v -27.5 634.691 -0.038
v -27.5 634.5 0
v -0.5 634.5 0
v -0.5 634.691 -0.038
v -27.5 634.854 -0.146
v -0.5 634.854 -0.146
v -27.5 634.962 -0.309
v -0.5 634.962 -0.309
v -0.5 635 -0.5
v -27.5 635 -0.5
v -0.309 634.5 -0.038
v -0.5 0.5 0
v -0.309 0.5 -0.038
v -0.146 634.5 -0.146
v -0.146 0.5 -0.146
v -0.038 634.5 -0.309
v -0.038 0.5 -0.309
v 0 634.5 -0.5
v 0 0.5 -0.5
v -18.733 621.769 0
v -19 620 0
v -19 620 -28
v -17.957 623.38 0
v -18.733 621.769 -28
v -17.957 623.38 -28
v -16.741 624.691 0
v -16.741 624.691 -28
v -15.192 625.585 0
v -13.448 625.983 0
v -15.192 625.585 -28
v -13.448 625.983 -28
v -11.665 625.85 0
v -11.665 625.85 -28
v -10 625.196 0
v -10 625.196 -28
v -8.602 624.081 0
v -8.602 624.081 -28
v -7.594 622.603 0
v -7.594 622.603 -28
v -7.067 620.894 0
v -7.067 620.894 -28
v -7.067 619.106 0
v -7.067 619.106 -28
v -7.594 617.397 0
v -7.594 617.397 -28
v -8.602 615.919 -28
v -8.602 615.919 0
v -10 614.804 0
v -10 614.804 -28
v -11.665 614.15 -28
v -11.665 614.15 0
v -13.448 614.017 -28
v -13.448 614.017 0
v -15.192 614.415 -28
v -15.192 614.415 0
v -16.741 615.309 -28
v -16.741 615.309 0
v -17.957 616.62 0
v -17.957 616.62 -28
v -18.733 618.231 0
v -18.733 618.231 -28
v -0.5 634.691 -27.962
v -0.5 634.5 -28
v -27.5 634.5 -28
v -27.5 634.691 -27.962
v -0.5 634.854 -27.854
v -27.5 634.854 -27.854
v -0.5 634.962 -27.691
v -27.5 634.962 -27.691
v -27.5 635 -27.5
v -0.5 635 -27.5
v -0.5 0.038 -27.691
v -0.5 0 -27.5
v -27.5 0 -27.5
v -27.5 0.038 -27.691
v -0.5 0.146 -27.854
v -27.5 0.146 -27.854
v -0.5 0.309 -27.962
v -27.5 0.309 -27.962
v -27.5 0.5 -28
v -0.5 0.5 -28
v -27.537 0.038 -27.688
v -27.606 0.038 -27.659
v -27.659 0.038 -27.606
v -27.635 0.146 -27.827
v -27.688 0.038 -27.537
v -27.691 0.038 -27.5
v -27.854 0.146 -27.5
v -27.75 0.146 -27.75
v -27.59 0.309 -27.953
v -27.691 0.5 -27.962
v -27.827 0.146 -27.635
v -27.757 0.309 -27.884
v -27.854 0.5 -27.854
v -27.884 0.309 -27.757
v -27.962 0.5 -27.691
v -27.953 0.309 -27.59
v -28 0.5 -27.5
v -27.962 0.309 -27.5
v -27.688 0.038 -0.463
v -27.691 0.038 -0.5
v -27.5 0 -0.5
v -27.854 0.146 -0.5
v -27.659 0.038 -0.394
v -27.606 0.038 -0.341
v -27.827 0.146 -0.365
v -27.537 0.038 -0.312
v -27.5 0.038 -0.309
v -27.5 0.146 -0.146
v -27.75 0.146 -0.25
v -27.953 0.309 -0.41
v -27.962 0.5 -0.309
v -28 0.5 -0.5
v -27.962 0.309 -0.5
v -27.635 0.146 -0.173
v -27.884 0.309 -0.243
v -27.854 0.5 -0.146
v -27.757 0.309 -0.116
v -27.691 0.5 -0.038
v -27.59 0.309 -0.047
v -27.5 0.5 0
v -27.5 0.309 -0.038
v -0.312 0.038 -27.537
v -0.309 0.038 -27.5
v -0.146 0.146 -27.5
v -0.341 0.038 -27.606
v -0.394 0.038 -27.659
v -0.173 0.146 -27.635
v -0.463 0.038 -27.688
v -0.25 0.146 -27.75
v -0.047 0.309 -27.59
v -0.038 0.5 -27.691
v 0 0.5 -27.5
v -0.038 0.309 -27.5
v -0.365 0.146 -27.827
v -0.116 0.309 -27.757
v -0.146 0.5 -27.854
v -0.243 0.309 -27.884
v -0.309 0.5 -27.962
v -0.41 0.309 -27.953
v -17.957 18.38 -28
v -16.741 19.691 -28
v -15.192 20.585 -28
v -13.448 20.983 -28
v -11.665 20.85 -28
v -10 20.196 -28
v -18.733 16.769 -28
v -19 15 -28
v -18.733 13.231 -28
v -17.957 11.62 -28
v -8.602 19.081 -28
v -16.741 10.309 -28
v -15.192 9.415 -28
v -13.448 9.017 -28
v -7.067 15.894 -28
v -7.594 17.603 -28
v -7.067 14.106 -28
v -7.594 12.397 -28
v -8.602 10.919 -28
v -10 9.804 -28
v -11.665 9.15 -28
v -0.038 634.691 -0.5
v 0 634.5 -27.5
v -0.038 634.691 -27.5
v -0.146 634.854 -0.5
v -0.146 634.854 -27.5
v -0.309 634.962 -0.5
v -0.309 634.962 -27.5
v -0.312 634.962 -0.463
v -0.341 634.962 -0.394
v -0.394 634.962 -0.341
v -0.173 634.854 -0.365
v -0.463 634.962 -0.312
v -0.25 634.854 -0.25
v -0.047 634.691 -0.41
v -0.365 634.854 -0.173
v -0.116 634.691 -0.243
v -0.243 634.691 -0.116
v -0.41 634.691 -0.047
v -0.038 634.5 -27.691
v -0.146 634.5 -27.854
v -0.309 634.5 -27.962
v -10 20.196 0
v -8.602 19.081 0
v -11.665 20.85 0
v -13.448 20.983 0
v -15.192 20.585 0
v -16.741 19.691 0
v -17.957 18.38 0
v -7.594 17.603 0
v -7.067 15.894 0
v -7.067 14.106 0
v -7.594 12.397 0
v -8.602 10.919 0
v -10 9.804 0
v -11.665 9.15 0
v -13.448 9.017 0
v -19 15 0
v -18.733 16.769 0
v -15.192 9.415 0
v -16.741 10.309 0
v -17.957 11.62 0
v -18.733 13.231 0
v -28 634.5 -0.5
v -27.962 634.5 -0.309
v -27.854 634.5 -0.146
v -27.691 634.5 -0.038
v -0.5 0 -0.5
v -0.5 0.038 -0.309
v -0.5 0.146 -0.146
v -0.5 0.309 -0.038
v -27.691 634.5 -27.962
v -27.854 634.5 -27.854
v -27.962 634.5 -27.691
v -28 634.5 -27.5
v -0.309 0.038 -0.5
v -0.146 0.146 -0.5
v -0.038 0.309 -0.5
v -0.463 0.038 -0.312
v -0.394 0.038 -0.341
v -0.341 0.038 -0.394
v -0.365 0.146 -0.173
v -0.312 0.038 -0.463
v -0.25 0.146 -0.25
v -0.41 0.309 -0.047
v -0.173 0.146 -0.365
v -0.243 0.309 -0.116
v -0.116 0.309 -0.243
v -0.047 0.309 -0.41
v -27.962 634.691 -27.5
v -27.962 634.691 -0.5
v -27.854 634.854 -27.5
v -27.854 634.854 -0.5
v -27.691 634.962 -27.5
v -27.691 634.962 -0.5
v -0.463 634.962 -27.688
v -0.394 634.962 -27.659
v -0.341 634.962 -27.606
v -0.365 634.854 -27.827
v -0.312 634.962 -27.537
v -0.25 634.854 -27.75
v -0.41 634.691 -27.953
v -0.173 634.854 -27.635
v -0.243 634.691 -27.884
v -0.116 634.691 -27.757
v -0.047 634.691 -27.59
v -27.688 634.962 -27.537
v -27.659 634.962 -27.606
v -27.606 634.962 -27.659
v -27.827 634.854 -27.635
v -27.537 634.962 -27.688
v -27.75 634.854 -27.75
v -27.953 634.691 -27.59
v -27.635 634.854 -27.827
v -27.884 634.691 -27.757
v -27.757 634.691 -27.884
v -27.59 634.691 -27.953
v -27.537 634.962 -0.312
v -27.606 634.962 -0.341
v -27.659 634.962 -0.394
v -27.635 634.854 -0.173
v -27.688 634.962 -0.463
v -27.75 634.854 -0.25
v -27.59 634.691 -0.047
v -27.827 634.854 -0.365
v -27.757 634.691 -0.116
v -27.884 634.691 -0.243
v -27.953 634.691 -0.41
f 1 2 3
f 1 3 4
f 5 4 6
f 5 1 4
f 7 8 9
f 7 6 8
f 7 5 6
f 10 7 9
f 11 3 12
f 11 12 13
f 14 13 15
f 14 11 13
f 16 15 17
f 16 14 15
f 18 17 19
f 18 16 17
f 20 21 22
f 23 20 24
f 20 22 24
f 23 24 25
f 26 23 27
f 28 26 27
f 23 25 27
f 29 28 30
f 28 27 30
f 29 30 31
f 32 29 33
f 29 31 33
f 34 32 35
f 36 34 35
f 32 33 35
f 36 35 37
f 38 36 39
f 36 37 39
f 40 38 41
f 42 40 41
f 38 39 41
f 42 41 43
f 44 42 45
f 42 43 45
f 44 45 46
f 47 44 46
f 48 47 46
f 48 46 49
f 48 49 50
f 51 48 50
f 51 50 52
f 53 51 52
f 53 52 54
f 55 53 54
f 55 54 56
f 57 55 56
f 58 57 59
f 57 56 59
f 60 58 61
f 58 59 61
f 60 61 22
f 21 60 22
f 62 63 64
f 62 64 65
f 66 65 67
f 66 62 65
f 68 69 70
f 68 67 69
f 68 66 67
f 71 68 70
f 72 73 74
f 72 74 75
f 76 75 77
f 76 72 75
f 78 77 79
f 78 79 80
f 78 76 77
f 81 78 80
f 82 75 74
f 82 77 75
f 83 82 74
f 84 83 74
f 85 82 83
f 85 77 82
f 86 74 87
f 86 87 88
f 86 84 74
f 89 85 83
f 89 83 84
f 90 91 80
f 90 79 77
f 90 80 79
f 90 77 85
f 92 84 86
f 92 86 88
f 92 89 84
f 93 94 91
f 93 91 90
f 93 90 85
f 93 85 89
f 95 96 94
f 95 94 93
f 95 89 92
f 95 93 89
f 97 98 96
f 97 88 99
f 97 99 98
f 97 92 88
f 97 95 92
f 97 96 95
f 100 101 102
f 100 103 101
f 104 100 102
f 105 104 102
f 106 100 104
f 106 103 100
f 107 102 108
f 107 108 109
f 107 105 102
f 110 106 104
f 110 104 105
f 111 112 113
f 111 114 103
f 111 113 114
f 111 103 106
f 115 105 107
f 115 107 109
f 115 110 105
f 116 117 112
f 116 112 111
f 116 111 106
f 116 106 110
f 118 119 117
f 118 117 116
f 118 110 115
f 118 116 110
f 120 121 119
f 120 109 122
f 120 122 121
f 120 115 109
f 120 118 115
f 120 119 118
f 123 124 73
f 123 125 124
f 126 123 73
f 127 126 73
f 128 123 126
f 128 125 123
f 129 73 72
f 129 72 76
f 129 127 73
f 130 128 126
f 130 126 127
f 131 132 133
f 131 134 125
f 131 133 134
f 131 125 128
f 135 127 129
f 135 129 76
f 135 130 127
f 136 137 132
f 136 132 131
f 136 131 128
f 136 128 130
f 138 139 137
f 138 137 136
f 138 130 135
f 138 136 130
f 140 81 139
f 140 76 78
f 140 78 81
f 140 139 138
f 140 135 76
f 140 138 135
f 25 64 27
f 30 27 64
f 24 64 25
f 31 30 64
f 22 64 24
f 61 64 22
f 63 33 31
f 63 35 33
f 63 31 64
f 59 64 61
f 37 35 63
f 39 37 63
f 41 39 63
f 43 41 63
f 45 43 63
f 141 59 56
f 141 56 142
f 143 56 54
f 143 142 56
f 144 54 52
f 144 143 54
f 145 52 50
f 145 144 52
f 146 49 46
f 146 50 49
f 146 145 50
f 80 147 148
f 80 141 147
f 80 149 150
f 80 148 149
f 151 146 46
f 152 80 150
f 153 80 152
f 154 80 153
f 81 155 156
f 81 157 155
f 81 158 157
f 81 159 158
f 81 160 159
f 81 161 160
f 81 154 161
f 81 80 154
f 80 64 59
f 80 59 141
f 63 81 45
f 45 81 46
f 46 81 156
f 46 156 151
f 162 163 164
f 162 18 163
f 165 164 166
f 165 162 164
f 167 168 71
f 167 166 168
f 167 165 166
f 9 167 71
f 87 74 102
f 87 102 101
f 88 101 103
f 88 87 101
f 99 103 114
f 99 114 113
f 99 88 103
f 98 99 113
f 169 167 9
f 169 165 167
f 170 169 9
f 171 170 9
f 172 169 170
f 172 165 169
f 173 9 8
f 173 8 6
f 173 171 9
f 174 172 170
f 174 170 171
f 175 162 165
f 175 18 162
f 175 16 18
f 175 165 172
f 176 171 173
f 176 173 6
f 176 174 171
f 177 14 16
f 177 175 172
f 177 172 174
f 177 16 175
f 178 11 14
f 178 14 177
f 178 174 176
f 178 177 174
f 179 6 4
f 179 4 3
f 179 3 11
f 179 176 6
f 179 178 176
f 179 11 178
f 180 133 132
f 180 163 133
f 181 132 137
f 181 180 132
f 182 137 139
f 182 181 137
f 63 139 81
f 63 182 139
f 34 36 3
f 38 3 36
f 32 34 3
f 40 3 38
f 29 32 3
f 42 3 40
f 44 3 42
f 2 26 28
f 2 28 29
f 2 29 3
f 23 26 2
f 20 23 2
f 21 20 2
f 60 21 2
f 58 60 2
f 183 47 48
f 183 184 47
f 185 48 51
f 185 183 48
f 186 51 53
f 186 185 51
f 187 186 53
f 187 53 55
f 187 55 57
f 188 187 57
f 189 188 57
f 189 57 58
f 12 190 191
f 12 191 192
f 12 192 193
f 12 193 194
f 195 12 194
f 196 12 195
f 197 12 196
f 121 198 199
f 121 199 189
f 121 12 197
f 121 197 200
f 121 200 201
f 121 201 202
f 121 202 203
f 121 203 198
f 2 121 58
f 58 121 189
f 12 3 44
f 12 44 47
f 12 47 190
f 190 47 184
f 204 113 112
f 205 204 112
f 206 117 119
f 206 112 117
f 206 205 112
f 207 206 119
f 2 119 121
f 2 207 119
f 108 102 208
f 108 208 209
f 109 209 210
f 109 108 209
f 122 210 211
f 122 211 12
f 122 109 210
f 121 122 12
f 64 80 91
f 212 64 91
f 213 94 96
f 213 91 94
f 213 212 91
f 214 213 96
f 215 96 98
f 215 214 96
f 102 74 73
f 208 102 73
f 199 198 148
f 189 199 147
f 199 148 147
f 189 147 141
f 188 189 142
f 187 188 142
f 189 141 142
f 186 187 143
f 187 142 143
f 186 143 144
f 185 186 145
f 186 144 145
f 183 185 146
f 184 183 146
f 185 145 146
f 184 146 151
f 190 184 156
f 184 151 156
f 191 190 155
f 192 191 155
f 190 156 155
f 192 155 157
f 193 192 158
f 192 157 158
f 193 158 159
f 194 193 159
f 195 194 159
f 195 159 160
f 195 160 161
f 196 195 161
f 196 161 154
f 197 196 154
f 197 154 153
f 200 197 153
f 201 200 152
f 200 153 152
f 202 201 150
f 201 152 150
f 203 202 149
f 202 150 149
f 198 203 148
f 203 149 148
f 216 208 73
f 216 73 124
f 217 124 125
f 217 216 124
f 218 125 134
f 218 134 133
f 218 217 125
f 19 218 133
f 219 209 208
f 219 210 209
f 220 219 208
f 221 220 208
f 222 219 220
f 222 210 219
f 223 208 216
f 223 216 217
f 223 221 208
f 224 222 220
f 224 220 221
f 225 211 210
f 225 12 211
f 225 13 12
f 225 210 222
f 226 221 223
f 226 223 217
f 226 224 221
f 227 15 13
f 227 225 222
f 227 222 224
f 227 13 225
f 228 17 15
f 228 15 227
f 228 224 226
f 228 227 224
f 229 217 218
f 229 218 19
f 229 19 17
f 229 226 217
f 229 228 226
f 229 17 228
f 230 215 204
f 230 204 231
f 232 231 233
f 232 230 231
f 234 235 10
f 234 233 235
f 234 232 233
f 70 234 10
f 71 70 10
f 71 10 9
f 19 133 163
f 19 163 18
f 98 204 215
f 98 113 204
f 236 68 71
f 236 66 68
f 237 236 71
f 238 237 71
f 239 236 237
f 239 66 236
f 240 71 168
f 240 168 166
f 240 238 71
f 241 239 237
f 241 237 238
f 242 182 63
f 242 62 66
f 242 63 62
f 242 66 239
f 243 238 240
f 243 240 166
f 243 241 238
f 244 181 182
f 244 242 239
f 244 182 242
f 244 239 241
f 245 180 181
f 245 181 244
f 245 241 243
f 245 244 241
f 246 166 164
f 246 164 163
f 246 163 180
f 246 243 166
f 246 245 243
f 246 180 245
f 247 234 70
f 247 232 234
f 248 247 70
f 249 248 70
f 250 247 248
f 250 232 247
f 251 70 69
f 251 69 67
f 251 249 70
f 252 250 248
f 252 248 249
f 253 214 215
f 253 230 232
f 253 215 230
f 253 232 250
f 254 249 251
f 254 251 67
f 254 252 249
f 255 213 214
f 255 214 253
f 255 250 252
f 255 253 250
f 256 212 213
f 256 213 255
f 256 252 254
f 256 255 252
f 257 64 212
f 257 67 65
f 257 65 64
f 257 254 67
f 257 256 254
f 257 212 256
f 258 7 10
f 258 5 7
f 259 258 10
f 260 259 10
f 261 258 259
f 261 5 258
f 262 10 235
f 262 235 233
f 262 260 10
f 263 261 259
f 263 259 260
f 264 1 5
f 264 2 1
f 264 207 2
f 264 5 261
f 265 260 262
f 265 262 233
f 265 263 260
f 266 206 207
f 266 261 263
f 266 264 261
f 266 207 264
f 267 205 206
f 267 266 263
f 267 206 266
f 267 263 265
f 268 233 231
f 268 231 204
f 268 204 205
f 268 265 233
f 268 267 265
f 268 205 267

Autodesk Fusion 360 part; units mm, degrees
sketch "Sketch2" plane through (0, 0, 0) normal (0, 1, 0) x (1, 0, 0)
  line L0 (0, 0) -> (-28, 0)
  line L1 (-28, 0) -> (-28, 28)
  line L2 (-28, 28) -> (0, 28)
  line L3 (0, 28) -> (0, 0)
  dimension "d1" = 28
  dimension "d2" = 28
extrude "Extrude1" add sketch "Sketch2" along normal blind 635
sketch "Sketch3" plane through (0, 0, -28) normal (0, 0, -1) x (-1, 0, 0)
  line L0 (0, 0) -> (28, 0)
  line L1 (28, 0) -> (28, 635)
  line L2 (28, 635) -> (0, 635)
  line L3 (0, 635) -> (0, 0)
  circle A0 centre (13, 620) radius 6
  line L4 (28, 317.5) -> (0, 317.5) construction
  circle A1 centre (13, 15) radius 6
  dimension "d5" = 12
  dimension "d6" = 15
  dimension "d7" = 15
extrude "Extrude2" cut sketch "Sketch3" against normal through all contours A0 | A1
fillet "Fillet1" radius 0.5 12 edges at (-28, 317.5, 0) (0, 317.5, 0) (-28, 317.5, -28) (0, 317.5, -28) (0, 635, -14) (-14, 635, -28) (-28, 635, -14) (-14, 635, 0) (-14, 0, 0) (-28, 0, -14) (0, 0, -14) (-14, 0, -28)
equation "d7 = d6"
